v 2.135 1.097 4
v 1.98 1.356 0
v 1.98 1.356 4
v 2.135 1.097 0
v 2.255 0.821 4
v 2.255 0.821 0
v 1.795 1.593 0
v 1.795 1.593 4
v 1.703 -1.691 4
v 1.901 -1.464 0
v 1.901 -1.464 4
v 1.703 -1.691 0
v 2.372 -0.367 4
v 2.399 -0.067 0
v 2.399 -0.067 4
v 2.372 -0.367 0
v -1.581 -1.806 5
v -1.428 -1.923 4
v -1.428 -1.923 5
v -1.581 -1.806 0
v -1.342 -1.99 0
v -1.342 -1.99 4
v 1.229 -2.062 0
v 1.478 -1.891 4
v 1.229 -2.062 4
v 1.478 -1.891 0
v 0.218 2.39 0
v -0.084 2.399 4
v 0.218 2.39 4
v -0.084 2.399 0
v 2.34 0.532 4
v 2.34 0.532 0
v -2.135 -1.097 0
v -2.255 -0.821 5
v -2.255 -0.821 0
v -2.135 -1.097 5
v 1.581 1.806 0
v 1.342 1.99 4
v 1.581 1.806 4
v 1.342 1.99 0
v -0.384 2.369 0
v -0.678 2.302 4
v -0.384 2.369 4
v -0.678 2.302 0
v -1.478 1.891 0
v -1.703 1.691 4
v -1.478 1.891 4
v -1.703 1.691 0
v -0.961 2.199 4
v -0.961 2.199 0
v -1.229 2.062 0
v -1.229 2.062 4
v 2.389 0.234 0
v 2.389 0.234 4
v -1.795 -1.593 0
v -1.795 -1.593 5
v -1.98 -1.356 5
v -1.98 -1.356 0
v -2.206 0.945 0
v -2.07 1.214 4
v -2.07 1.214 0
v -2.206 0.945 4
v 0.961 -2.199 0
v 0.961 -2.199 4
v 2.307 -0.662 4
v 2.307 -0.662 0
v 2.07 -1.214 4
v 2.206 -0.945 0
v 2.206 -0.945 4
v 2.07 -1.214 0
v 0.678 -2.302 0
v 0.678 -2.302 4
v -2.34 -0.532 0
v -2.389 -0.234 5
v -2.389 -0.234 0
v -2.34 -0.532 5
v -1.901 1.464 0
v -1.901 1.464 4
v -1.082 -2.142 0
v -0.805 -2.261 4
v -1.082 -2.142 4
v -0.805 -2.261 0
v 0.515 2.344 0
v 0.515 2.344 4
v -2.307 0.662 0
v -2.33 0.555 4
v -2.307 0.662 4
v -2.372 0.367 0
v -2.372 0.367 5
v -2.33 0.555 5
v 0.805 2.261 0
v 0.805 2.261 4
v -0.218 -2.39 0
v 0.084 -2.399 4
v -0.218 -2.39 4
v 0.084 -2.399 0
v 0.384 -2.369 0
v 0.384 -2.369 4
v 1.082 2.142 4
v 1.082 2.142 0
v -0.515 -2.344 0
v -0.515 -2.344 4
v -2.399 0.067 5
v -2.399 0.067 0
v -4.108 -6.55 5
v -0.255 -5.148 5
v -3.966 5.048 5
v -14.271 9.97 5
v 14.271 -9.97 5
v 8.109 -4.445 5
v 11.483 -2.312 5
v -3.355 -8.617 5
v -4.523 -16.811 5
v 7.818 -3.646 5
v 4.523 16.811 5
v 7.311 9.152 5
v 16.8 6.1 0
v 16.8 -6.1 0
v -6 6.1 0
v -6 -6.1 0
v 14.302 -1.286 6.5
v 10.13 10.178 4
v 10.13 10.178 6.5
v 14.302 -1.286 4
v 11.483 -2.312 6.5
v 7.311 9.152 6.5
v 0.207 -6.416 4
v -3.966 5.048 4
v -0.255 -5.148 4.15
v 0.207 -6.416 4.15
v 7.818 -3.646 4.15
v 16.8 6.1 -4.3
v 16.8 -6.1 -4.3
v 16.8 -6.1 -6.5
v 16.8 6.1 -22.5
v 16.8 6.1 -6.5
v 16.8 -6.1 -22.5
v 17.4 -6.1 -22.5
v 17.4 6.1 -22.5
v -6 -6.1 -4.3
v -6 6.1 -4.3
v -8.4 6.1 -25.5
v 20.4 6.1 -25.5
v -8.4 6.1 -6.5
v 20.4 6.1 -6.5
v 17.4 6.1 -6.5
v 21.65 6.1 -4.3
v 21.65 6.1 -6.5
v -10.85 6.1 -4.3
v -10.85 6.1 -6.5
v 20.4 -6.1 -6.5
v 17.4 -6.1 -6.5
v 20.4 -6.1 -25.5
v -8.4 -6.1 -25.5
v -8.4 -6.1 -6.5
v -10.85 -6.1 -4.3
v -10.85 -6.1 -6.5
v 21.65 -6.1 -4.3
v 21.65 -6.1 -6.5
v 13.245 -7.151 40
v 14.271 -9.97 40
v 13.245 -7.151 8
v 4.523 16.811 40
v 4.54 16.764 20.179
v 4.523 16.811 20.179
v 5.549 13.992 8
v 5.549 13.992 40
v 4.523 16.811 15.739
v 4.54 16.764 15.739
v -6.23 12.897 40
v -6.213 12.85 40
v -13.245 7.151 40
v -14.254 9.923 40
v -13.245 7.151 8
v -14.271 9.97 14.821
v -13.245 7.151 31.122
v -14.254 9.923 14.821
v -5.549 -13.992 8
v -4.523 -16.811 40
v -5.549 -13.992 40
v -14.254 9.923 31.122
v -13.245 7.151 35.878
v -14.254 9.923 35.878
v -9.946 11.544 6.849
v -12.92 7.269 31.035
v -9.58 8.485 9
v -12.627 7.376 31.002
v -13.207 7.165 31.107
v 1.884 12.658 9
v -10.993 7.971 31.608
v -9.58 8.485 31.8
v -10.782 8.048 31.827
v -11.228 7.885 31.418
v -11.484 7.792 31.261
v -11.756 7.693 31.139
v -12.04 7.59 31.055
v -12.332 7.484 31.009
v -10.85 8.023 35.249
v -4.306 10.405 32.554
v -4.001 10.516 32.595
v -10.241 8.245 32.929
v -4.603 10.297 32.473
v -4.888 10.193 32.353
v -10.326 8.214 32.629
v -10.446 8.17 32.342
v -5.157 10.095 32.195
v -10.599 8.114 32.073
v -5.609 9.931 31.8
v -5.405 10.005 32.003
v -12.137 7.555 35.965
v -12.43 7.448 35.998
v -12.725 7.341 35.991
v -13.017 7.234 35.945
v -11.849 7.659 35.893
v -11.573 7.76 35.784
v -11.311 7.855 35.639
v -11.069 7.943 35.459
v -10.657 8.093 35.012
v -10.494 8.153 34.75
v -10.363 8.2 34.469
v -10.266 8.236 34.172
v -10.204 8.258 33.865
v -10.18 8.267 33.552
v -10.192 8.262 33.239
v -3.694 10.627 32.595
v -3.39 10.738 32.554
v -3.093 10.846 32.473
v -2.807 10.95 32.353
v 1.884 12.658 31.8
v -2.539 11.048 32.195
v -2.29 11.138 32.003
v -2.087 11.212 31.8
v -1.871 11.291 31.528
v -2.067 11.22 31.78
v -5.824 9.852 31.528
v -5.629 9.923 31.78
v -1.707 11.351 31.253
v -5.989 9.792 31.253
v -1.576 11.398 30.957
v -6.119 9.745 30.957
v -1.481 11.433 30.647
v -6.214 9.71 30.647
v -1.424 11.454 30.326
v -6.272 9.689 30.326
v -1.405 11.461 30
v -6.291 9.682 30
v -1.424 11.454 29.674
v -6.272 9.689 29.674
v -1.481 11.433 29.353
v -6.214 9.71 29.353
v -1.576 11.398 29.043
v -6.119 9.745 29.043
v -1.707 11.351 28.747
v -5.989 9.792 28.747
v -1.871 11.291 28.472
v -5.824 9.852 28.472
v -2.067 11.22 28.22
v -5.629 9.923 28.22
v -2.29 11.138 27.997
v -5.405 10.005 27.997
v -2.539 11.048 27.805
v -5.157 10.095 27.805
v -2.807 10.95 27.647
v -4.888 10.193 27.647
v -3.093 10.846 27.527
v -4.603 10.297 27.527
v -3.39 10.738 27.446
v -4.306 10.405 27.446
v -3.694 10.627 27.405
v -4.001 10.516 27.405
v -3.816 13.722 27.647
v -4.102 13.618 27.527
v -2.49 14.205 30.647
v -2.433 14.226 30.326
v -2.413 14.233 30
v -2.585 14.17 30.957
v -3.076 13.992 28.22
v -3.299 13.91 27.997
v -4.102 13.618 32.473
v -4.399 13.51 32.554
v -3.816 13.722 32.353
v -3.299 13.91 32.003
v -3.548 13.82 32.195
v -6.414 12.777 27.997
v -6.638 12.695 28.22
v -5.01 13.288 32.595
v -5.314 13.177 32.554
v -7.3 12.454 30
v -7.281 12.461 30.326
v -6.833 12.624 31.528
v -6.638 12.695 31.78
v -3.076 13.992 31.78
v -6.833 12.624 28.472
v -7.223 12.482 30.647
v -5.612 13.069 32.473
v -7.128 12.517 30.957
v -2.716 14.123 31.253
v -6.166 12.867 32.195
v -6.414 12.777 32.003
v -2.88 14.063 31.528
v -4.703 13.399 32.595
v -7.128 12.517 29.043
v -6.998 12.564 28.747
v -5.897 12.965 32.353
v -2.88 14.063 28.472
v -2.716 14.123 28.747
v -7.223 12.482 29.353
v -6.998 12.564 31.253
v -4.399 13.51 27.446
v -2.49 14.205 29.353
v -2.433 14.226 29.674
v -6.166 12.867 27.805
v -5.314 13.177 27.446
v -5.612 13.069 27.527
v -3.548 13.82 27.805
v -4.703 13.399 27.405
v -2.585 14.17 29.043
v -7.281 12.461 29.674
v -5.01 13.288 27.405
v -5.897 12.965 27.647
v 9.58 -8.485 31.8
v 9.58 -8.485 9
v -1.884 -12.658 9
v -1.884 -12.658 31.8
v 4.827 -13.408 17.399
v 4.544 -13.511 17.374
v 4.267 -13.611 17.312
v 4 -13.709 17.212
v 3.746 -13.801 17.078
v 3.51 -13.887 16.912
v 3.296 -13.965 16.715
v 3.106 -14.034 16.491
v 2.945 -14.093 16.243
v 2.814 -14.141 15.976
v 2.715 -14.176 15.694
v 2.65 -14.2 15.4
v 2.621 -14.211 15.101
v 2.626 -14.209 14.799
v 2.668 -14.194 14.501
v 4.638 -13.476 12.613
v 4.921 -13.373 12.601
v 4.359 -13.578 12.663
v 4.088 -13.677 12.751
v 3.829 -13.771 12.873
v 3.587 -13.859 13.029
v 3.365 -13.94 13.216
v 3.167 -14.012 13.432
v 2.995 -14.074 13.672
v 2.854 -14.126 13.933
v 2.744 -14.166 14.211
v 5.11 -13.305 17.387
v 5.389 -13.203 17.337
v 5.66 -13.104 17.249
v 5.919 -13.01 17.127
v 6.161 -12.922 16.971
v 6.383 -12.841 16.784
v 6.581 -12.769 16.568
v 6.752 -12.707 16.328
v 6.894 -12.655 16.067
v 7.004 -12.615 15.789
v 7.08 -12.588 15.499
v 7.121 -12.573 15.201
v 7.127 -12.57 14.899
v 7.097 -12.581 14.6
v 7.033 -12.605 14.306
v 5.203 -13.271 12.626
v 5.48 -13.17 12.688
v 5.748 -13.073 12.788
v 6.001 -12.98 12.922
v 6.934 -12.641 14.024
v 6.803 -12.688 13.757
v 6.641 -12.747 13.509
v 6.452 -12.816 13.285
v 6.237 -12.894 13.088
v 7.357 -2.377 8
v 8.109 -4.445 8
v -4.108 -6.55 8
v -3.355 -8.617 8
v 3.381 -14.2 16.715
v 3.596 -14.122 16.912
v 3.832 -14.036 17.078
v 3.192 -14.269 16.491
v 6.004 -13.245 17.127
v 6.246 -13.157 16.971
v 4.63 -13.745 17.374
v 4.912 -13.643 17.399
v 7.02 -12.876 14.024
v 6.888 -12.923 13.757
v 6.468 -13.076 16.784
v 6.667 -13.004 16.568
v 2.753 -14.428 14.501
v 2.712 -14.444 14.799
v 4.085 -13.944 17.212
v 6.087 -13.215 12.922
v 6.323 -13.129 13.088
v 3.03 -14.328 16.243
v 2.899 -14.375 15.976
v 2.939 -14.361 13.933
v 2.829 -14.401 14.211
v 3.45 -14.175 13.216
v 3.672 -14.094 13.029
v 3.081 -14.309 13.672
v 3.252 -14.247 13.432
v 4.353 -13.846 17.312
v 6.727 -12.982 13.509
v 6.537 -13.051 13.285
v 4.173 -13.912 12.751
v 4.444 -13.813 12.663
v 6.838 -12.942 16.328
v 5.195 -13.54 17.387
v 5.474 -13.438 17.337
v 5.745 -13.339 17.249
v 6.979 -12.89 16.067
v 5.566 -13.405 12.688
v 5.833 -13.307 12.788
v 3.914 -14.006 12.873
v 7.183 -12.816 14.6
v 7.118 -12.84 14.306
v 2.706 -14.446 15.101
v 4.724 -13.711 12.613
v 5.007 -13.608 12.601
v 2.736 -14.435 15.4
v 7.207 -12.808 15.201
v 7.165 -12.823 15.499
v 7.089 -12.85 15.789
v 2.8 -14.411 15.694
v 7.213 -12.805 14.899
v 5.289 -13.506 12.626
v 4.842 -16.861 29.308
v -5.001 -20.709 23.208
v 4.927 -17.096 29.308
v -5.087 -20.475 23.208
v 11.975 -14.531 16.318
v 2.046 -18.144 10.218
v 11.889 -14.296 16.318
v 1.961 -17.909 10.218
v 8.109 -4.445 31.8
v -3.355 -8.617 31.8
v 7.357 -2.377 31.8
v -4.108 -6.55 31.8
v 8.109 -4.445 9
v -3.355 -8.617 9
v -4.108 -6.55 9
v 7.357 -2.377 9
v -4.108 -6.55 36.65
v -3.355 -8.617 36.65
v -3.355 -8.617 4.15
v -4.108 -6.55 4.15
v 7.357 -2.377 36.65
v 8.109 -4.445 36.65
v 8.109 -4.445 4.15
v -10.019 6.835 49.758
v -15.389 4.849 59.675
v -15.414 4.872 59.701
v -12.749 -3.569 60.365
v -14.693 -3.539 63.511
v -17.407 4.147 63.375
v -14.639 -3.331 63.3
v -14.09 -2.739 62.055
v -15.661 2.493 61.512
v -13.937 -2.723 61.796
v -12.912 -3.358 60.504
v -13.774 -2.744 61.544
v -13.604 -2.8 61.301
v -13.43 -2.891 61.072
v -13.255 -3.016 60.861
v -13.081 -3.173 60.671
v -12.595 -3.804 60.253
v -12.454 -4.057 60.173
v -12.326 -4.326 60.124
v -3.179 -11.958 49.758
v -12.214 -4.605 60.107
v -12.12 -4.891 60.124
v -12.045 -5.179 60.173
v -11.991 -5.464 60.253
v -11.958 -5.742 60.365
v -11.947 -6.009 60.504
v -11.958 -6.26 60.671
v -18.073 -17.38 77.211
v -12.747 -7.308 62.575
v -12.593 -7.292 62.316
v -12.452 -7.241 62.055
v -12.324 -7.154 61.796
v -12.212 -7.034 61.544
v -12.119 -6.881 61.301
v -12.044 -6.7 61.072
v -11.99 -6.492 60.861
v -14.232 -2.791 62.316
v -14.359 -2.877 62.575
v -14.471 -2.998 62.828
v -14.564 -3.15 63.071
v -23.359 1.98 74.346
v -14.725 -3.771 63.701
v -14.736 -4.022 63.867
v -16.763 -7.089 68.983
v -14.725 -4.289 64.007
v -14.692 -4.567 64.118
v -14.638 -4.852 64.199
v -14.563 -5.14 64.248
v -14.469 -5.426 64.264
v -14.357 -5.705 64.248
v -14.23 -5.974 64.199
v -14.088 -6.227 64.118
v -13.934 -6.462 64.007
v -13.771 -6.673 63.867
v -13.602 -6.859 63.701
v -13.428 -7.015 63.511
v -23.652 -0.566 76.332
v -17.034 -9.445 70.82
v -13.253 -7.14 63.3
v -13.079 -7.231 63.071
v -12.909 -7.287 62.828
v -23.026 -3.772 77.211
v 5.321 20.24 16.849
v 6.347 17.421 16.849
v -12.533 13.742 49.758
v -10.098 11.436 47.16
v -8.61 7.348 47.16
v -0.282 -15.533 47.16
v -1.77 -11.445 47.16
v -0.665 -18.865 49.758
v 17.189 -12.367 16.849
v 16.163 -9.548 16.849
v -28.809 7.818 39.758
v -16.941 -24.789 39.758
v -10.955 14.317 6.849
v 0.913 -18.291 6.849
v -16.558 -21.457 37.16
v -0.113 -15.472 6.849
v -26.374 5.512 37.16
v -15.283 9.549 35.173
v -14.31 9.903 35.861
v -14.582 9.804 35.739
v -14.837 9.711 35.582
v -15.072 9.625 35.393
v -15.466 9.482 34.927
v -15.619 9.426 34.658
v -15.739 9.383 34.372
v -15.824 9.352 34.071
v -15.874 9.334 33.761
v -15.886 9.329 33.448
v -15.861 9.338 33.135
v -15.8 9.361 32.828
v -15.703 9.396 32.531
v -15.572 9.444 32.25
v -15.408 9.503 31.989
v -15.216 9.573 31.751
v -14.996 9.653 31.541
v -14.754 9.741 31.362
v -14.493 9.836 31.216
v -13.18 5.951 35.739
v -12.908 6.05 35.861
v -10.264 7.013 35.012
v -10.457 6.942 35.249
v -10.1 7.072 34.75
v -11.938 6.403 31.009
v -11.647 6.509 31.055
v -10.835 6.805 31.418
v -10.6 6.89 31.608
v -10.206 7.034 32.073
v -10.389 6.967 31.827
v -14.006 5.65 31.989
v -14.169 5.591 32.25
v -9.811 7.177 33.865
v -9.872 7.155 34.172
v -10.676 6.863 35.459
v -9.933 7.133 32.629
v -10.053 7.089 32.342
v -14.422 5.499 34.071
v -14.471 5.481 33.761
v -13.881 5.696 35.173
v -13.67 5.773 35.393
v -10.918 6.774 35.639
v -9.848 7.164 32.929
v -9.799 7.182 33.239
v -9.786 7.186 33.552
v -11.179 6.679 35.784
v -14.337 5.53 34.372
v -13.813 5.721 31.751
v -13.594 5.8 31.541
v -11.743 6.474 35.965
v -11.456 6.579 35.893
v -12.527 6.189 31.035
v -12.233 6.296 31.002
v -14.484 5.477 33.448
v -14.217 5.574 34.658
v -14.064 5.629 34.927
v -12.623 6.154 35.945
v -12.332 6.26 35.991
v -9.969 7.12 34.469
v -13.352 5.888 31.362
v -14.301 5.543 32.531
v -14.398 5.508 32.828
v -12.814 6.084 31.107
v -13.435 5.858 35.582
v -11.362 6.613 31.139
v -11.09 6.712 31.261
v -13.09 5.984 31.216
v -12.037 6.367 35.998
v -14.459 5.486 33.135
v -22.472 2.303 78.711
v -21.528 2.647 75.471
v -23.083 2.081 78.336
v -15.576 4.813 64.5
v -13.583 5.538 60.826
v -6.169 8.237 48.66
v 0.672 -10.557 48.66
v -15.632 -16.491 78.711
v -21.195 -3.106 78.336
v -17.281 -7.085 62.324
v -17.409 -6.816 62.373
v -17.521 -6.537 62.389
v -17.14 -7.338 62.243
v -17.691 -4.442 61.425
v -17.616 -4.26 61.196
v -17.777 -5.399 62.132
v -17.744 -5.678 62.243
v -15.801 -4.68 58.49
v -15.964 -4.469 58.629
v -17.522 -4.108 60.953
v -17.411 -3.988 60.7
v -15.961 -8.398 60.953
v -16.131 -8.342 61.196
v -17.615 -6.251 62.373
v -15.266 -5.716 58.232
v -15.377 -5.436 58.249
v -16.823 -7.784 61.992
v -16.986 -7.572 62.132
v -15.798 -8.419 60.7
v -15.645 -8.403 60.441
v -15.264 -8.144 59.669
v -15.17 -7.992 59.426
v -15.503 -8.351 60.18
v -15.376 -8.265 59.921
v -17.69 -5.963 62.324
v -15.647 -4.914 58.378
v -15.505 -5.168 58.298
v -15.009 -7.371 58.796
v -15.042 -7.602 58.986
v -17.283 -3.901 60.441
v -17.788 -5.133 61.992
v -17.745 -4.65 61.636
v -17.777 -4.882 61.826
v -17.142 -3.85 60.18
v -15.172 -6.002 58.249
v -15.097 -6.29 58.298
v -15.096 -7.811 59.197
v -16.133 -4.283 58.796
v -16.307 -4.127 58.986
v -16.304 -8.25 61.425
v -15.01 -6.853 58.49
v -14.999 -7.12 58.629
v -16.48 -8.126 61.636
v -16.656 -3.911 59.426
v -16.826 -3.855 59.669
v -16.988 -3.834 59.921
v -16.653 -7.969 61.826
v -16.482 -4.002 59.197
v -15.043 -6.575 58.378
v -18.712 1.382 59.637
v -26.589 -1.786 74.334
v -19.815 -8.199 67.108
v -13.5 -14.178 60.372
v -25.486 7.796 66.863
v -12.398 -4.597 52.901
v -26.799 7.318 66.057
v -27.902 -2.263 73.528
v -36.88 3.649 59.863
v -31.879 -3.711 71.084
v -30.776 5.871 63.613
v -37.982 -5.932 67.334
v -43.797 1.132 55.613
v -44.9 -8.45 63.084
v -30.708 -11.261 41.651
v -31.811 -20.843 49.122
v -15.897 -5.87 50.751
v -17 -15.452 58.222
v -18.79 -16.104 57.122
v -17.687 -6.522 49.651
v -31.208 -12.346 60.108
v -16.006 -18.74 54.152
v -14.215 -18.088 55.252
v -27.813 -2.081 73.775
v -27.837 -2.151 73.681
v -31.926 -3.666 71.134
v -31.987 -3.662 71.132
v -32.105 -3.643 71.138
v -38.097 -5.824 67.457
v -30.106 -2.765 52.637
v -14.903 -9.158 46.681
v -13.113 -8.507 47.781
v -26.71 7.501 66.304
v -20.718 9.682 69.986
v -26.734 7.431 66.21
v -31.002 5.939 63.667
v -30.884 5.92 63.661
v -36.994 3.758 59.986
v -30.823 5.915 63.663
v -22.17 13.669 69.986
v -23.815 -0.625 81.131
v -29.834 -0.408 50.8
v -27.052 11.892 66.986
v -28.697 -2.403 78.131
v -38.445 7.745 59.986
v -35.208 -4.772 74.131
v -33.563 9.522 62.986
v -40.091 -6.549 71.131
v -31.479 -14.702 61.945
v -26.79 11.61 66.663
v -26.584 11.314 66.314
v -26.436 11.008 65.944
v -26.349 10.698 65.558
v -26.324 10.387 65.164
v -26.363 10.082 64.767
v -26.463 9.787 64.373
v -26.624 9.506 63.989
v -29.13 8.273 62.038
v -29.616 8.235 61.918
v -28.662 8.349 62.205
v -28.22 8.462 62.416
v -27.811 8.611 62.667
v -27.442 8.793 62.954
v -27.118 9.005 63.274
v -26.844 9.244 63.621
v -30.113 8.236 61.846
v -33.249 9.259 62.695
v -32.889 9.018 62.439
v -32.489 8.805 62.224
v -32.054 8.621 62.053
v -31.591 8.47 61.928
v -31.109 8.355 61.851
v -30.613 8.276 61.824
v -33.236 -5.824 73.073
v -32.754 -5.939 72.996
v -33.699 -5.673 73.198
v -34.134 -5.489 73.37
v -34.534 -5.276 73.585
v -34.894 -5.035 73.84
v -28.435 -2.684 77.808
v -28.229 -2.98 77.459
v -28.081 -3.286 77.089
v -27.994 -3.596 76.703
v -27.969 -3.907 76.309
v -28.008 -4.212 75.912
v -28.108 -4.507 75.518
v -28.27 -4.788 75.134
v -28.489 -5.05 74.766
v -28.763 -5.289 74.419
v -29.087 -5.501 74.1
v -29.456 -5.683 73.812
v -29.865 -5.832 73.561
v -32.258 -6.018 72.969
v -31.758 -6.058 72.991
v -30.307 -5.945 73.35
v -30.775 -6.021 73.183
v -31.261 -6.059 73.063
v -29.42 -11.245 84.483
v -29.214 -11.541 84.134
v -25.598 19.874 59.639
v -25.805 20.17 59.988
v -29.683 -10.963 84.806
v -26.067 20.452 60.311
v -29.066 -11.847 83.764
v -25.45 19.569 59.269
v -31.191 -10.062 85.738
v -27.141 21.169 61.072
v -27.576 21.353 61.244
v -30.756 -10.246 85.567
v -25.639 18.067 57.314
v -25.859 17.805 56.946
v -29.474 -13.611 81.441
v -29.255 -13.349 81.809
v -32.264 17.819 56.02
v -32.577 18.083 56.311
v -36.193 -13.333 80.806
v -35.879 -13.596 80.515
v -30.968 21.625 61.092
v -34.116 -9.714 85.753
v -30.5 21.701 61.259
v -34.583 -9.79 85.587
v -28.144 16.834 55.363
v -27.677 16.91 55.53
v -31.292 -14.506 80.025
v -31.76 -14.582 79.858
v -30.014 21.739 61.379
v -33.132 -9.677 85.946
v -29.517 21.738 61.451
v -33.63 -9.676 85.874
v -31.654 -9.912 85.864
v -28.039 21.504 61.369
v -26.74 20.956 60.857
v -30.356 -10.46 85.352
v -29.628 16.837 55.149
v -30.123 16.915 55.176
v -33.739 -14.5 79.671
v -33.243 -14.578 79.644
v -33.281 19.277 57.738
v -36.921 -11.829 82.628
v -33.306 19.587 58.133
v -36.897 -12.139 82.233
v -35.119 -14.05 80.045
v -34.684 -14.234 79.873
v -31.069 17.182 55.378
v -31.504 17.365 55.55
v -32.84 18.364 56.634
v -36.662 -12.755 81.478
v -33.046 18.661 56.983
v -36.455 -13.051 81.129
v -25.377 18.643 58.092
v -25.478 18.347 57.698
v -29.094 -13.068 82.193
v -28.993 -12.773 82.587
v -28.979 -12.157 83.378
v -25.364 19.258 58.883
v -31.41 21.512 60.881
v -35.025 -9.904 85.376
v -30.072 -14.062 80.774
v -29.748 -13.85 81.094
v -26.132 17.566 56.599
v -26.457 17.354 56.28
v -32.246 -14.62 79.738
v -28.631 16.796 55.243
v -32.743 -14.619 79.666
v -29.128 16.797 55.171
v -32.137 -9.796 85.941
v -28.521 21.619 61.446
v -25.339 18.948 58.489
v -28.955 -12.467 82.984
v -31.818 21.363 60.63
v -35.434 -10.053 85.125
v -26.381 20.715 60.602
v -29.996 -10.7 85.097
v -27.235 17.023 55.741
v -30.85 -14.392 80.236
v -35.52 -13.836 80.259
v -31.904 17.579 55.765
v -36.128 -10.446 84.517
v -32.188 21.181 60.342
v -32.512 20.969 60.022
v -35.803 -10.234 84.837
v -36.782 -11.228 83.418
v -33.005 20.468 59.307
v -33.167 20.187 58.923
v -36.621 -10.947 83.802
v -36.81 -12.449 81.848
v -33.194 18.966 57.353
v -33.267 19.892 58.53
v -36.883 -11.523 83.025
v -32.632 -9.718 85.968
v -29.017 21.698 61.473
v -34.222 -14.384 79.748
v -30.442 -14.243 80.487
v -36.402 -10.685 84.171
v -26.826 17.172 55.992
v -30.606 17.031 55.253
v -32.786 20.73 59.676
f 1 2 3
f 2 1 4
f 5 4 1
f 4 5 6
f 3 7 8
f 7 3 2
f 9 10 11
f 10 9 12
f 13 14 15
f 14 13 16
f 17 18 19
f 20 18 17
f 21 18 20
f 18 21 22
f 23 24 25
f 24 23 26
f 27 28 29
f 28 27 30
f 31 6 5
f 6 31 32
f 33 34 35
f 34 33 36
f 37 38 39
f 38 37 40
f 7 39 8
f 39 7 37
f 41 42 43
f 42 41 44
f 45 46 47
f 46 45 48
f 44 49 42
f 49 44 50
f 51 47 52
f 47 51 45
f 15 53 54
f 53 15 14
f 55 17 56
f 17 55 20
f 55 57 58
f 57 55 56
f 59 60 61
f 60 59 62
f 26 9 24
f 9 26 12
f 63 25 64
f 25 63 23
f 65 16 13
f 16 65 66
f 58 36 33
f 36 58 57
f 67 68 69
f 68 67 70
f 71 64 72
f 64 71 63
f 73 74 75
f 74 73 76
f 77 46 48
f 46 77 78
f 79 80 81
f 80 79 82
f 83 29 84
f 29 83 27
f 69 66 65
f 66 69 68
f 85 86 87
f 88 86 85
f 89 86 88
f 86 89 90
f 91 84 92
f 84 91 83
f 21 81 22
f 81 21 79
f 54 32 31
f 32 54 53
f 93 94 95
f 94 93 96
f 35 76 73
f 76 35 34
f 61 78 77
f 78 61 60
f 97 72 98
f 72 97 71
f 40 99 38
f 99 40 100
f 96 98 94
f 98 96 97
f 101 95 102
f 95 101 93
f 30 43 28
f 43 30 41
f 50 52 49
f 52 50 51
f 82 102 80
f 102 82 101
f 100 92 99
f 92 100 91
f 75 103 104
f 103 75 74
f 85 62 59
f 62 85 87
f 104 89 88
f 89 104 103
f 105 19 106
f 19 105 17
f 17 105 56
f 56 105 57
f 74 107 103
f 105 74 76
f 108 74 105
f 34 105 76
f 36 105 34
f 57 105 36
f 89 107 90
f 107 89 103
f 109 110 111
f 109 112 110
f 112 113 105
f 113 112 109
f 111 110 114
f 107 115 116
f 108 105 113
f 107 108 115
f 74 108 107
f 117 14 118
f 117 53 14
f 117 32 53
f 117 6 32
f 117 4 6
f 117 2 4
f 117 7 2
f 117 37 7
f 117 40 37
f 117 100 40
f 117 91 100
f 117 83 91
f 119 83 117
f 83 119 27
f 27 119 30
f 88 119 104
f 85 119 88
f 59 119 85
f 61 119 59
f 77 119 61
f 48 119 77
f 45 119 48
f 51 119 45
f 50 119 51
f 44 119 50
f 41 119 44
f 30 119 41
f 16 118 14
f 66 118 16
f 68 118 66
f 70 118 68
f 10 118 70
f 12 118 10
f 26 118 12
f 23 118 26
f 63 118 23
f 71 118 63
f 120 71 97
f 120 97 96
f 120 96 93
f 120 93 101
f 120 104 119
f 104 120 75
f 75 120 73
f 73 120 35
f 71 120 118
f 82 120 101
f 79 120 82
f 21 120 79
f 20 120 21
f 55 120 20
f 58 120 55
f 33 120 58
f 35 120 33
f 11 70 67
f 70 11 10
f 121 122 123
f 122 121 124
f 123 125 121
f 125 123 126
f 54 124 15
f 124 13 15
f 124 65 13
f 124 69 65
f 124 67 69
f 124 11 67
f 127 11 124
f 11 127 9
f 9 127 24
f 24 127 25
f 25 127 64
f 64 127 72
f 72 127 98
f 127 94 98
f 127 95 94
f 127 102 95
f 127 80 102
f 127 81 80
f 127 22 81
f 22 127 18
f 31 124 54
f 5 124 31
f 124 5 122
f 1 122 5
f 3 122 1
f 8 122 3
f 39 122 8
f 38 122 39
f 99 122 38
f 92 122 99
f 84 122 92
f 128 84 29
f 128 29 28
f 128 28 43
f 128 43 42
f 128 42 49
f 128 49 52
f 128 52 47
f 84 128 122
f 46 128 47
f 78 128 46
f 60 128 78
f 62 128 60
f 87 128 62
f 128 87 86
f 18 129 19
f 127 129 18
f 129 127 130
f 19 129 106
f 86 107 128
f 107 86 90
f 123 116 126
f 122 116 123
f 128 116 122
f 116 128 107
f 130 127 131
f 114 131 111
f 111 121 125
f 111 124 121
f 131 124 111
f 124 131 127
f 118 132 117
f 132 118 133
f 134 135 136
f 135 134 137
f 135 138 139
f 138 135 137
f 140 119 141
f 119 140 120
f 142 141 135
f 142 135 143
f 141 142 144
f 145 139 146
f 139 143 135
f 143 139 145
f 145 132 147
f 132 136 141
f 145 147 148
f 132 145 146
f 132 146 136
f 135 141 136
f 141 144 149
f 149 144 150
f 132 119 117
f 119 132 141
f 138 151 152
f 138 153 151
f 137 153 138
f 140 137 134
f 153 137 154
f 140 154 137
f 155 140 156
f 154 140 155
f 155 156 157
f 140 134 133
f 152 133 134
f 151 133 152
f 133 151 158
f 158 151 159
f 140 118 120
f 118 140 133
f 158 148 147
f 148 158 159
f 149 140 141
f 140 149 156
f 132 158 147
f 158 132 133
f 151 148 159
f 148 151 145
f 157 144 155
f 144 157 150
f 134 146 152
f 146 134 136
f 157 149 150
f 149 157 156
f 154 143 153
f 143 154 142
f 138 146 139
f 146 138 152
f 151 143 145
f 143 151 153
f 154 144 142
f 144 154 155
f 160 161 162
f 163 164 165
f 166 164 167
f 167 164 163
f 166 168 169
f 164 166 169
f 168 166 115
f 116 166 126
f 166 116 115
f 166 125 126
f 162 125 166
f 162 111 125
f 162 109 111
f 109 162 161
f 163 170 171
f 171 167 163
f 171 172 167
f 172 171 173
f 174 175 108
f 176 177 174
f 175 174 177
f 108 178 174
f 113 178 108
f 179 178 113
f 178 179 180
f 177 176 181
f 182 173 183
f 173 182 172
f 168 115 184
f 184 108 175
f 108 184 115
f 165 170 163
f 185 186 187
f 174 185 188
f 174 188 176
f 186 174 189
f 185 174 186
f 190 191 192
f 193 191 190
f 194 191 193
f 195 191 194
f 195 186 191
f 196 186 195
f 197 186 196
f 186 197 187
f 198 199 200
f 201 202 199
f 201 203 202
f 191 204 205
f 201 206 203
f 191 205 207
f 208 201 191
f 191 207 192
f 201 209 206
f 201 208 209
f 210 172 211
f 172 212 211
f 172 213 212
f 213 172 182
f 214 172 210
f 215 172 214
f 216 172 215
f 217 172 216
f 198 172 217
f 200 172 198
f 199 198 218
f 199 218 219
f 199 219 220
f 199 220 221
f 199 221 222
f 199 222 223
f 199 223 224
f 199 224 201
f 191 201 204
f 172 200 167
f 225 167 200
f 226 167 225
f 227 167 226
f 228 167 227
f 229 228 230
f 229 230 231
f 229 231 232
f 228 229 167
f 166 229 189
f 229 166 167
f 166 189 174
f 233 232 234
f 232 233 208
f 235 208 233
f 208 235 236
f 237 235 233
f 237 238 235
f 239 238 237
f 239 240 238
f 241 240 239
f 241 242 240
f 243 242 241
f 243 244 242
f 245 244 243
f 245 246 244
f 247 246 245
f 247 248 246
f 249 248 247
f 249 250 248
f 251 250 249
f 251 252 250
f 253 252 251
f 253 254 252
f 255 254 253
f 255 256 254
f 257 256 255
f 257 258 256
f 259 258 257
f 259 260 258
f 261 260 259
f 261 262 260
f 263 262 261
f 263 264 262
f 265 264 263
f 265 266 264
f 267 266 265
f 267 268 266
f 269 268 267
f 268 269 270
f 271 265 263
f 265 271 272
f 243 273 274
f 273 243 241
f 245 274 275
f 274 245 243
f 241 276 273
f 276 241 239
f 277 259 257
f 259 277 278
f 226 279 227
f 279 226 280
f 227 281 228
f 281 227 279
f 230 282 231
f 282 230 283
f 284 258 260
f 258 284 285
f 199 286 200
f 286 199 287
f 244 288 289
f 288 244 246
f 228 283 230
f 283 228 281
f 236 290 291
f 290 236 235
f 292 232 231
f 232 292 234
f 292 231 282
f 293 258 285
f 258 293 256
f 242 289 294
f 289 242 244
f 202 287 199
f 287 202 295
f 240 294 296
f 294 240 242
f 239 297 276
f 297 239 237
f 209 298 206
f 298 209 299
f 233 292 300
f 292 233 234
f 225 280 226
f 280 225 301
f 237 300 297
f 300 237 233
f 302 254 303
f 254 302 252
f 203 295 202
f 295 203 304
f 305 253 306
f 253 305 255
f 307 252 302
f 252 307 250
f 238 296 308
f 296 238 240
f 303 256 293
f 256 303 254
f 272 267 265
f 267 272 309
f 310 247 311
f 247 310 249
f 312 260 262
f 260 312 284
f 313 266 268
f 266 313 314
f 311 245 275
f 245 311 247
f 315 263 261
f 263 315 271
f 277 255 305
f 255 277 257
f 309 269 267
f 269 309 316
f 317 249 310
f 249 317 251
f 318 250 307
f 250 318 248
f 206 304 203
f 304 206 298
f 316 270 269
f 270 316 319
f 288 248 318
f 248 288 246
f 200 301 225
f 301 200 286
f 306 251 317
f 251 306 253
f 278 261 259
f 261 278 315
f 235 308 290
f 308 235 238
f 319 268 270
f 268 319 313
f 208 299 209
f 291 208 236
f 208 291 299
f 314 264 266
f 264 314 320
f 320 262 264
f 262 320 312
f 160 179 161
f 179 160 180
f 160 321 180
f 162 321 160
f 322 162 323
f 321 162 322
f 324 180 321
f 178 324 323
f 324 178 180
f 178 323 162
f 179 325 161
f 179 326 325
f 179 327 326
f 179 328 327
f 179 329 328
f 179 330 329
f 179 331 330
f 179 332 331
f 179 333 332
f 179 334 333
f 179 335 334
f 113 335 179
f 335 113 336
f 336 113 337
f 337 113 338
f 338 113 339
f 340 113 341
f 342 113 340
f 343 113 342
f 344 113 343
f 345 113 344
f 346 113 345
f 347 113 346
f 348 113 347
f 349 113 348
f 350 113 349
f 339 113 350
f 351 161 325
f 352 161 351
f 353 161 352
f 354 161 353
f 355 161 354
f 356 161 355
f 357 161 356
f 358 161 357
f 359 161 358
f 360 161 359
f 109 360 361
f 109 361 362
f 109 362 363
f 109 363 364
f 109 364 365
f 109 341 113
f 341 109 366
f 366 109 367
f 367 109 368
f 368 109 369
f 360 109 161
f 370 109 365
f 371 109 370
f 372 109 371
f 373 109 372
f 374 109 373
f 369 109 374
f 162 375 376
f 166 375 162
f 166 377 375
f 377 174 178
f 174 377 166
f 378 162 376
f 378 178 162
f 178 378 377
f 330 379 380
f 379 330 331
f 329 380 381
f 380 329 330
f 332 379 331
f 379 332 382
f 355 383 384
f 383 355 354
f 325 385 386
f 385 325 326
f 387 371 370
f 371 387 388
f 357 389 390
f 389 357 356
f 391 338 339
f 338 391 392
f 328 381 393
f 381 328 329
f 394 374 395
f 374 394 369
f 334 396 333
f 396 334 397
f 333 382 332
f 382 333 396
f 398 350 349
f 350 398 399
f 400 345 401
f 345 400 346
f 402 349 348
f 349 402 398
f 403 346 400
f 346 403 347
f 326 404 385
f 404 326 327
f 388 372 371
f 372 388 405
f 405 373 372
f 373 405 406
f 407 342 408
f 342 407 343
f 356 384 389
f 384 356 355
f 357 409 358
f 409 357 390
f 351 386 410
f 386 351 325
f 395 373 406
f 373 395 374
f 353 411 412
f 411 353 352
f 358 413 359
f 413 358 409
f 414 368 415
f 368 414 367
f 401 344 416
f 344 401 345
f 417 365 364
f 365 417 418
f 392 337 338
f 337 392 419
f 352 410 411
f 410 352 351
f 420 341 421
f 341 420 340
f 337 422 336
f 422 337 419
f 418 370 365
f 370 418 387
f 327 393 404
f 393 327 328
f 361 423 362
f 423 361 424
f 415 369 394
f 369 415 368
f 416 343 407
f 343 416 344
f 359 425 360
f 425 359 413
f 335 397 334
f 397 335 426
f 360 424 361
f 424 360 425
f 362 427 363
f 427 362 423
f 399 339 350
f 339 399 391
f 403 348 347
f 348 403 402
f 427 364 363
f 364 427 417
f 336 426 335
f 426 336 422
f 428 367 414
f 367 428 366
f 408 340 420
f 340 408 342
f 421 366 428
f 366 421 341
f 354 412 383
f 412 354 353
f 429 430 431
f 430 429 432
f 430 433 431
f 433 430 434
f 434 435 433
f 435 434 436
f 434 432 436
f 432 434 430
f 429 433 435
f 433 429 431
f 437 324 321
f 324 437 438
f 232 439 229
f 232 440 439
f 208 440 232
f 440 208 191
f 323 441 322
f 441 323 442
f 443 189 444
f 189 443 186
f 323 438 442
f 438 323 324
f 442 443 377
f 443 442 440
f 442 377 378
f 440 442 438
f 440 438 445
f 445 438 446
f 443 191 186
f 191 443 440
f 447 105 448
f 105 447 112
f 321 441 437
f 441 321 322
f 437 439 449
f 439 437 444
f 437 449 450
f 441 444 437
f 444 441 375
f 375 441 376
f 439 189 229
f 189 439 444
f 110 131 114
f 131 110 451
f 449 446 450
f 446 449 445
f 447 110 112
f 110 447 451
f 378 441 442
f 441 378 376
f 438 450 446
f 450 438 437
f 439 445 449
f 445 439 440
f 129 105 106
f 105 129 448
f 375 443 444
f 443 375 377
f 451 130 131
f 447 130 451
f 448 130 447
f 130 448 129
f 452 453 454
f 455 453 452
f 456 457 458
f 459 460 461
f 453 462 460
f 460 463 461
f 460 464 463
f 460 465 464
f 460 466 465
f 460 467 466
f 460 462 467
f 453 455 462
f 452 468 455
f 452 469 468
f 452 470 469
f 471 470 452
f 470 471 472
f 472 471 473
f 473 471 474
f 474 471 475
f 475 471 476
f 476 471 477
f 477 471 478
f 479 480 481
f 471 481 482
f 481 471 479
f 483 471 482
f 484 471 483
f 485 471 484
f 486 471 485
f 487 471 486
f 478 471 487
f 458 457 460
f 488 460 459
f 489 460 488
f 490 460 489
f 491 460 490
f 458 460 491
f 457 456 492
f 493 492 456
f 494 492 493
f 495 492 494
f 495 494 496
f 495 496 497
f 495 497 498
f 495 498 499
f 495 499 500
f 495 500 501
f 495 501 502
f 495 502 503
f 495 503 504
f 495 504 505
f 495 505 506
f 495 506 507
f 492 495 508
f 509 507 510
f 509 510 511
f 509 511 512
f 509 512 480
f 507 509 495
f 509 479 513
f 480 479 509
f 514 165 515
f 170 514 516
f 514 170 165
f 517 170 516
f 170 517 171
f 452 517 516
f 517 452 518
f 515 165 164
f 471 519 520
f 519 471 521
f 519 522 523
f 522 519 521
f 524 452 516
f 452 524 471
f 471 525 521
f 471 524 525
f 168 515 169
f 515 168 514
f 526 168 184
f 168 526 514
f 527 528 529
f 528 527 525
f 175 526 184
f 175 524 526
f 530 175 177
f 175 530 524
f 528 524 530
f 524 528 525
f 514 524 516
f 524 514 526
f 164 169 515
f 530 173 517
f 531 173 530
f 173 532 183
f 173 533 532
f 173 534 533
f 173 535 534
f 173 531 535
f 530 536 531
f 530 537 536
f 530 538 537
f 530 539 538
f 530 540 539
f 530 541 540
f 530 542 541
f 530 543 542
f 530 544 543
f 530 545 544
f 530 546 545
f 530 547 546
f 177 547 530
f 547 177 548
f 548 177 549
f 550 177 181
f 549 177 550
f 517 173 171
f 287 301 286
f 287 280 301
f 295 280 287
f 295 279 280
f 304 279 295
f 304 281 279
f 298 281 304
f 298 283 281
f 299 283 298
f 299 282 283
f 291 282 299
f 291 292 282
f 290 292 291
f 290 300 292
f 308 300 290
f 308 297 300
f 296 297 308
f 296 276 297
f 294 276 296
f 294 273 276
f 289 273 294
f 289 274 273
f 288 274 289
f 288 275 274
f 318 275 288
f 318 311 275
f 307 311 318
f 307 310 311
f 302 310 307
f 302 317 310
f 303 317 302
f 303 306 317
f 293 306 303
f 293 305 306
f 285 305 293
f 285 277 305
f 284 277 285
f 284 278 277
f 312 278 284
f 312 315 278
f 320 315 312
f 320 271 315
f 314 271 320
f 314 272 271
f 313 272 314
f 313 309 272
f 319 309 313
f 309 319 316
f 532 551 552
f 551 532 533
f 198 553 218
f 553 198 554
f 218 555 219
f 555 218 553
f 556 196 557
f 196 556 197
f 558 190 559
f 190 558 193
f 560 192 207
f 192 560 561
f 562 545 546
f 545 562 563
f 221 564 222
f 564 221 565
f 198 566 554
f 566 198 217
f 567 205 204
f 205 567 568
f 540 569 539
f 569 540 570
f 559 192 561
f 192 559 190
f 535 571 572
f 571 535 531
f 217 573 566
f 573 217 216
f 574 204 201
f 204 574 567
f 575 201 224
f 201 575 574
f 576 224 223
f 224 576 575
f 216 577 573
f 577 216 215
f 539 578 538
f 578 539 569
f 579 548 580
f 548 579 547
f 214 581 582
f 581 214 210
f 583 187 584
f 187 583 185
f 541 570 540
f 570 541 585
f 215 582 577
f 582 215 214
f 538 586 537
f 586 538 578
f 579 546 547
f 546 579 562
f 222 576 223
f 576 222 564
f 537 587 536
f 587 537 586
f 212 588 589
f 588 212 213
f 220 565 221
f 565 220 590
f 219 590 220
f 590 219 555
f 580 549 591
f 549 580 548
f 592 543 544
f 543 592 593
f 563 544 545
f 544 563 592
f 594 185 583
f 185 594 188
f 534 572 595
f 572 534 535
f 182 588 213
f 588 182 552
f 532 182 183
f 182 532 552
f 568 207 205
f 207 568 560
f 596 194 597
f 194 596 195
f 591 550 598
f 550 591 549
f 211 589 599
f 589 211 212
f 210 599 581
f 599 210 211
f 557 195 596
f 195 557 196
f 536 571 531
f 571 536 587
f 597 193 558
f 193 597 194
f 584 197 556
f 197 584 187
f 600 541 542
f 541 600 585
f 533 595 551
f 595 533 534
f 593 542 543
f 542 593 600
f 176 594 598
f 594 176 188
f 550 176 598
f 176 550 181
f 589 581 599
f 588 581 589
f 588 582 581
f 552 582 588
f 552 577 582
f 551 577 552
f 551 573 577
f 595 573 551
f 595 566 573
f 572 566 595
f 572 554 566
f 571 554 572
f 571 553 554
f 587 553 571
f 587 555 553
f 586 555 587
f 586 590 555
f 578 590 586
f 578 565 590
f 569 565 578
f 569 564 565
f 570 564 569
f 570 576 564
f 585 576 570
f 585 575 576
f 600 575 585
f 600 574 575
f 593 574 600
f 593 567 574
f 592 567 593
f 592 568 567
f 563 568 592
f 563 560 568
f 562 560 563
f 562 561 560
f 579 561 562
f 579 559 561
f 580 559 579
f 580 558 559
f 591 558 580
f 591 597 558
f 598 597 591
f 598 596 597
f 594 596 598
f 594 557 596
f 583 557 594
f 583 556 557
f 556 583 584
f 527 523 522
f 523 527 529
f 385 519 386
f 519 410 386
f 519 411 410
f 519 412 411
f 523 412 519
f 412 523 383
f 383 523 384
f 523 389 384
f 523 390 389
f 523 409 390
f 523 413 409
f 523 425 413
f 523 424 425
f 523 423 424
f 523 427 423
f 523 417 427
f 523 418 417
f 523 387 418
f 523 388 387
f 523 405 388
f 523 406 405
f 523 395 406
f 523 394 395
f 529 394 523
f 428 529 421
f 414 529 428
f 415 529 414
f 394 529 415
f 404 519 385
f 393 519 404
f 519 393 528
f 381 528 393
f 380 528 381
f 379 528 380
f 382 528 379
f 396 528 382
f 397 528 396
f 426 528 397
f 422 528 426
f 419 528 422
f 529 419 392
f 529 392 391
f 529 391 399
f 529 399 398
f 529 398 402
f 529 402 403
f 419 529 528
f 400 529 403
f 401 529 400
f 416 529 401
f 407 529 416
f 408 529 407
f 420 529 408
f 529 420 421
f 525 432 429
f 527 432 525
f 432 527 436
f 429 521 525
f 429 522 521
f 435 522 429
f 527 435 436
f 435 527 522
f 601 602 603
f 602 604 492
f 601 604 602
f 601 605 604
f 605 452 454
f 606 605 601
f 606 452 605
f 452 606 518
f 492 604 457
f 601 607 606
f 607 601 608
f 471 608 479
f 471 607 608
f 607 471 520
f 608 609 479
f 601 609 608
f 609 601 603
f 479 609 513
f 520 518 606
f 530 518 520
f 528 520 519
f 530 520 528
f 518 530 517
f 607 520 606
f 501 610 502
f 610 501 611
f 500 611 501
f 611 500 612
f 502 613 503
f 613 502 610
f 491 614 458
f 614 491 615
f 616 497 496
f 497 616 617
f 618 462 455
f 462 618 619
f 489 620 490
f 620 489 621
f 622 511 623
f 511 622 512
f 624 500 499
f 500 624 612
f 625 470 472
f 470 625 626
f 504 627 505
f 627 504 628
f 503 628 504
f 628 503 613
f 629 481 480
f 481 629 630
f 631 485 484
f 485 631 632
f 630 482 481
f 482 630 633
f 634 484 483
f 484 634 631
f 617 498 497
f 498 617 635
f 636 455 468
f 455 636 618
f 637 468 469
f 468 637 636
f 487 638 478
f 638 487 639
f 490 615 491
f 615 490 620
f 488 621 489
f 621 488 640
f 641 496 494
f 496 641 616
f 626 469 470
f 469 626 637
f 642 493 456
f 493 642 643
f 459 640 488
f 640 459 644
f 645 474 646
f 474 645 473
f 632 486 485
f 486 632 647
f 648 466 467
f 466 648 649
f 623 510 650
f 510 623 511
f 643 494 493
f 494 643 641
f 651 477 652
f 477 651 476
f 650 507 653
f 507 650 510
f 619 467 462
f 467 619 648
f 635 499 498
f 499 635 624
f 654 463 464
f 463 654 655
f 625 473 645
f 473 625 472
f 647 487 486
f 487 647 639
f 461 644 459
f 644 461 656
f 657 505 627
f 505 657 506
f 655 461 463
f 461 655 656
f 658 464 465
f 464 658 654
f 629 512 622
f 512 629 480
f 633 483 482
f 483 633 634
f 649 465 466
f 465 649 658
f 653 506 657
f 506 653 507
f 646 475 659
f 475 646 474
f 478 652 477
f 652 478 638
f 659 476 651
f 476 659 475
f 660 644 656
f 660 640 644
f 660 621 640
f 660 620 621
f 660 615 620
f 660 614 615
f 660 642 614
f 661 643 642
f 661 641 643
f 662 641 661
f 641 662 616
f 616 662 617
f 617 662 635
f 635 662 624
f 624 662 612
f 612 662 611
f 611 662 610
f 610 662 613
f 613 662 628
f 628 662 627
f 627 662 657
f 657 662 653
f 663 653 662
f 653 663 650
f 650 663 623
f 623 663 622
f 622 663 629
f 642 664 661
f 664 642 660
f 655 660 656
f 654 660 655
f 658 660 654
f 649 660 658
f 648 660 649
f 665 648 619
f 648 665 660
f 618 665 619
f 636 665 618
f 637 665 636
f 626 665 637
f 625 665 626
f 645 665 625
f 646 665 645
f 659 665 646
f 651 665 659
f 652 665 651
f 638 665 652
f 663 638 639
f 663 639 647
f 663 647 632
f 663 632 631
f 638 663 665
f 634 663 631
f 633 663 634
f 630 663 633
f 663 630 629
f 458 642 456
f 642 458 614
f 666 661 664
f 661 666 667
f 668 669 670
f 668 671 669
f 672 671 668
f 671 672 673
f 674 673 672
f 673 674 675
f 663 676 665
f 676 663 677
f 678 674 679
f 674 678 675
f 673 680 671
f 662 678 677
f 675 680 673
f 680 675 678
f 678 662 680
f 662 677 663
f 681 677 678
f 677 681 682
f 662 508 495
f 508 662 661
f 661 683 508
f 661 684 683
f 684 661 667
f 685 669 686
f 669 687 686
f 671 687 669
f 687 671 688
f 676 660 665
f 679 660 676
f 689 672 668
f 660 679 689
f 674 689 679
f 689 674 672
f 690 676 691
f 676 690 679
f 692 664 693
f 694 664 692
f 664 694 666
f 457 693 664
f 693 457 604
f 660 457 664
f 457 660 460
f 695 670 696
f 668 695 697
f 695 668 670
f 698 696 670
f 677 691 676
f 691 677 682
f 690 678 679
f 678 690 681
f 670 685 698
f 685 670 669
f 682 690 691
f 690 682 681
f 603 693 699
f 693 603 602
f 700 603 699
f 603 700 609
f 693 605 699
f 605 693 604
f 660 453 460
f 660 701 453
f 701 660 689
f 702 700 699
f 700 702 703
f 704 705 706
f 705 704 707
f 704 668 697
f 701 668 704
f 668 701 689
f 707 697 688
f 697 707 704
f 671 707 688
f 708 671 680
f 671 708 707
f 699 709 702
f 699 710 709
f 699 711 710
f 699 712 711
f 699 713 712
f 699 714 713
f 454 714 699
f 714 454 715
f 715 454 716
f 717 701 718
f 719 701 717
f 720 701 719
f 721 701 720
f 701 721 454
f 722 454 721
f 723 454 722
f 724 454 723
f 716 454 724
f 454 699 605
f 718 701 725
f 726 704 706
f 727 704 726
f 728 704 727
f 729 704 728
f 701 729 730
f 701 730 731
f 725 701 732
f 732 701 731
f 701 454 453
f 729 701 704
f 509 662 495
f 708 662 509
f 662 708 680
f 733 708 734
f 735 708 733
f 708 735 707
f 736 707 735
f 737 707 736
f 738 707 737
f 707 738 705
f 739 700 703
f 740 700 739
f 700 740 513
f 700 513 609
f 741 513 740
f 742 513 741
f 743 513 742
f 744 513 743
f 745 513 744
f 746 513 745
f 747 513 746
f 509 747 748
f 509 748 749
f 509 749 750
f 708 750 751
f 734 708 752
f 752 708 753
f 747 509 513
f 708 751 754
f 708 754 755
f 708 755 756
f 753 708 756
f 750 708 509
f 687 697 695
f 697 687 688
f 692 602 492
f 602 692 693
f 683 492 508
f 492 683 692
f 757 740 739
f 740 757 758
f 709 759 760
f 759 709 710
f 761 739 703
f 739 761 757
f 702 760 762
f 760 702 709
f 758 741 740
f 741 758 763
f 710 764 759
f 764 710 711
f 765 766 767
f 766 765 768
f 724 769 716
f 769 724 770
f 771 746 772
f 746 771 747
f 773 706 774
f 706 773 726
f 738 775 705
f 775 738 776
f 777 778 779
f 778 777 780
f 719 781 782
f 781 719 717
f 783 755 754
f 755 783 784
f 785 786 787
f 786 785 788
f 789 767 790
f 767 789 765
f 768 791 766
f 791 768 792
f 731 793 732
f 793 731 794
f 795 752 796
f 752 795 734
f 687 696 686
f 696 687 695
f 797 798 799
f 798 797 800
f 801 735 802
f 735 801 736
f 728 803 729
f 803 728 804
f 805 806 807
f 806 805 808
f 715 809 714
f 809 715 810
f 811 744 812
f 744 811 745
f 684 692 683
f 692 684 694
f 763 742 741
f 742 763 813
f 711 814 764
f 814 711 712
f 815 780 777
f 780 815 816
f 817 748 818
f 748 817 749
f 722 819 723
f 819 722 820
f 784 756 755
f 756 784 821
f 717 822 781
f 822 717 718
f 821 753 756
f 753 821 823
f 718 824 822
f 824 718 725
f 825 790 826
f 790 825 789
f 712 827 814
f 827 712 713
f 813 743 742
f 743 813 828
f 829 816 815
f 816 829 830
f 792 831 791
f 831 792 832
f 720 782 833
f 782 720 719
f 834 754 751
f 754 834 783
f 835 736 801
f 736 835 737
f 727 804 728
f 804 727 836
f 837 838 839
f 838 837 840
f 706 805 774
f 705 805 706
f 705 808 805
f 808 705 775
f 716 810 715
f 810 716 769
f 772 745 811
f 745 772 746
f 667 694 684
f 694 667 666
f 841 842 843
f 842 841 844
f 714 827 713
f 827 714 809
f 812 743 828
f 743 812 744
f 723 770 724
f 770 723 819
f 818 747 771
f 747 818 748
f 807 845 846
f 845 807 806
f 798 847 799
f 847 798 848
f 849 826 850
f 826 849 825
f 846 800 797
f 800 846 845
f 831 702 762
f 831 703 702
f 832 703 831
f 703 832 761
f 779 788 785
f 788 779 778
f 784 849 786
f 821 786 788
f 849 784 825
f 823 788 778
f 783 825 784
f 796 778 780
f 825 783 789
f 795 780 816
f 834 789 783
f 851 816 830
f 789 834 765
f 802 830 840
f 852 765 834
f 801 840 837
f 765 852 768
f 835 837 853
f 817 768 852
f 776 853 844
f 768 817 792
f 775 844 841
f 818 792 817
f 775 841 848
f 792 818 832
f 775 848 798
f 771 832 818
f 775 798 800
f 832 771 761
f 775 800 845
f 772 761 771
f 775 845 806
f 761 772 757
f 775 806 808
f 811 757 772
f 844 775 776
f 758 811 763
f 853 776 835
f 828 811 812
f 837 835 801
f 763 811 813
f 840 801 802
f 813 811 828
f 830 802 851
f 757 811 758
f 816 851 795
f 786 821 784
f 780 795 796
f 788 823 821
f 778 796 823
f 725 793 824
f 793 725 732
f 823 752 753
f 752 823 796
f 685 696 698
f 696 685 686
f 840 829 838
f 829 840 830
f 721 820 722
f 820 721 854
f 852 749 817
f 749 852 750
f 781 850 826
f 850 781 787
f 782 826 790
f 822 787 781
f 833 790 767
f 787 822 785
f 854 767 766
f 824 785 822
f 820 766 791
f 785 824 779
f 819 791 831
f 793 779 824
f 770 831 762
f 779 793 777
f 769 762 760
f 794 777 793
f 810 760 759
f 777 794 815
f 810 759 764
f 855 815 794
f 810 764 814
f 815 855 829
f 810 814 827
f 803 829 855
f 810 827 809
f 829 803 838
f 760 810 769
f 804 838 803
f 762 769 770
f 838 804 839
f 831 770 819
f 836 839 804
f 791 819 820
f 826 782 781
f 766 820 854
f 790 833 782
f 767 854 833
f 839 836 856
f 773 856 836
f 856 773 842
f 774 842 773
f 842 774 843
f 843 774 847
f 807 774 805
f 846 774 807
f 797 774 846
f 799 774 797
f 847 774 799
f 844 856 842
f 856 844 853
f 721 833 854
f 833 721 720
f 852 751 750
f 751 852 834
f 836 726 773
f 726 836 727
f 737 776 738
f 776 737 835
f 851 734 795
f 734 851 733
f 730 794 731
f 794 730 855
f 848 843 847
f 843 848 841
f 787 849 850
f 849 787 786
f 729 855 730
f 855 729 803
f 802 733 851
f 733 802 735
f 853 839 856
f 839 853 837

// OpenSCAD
// MG90S 3-Axis Joint - Zero Hardcoded Values
// Designed for a 3-segment line with Yaw, Pitch, and Roll capability

/* [Joint Controls] */
Yaw_Angle     = 20; 
Pitch_Angle   = 30; 
Roll_Angle    = 45;

/* [Servo Constants (MG90S Spec)] */
S_Width       = 12.2; // Width of the servo body
S_Length      = 22.8; // Length of the main rectangular body block
S_Body_H      = 22.5; // Total height of the main plastic housing
S_Shaft_Off   = 6.0;  // Offset from front edge to gear center (critical for alignment)
S_Flange_L    = 32.5; // Total length including mounting "ears"
S_Flange_H    = 2.2;  // Thickness of the mounting flanges
S_Flange_Z    = 16.0; // Distance from bottom of body to bottom of flange
S_Shaft_D     = 4.8;  // Diameter of the output gear/shaft
S_Shaft_H     = 5.0;  // Height of the shaft above the body
S_Horn_L      = 15.0; // Length of the plastic horn/arm
S_Horn_T      = 2.5;  // Thickness of the servo horn

/* [Bracket Constants] */
thick         = 3.0;   // Structural wall thickness
clearance     = 0.1;   // Precision tolerance
pivot_z       = 25.0;  // Center of rotation for Pitch axis
base_gap      = 5.0;   // Vertical space above Yaw horn
yoke_arm_w    = 20.0;  // Width of the bracket arms
pin_d         = 5.0;   // Passive pivot pin diameter

// Calculated widths to ensure perfect nesting
inner_w       = S_Body_H; 
outer_w       = inner_w + (thick * 2) + (clearance * 2) + (thick * 2);

$fn = 50;

module mg90s_core(rotation=0) {
    // 1. Static Body
    color("DimGray") {
        translate([-S_Shaft_Off, -S_Width/2, -S_Body_H])
            cube([S_Length, S_Width, S_Body_H]);
    }
    color("Gray") {
        translate([-(S_Flange_L-S_Length)/2 - S_Shaft_Off, -S_Width/2, -S_Body_H + S_Flange_Z])
            cube([S_Flange_L, S_Width, S_Flange_H]);
    }
    // 2. Rotating Output
    rotate([0, 0, rotation]) {
        color("Gold") cylinder(d=S_Shaft_D, h=S_Shaft_H);
        color("White") translate([-2, -S_Width/2, S_Shaft_H - 1]) 
            cube([S_Horn_L, S_Width, S_Horn_T]);
    }
}

module inner_yoke_blue(w, h, t) {
    color("RoyalBlue", 0.6) {
        translate([-yoke_arm_w/2, -w/2 - t, 0]) cube([yoke_arm_w, w + (t * 2), t]);
        for(side = [-1, 1]) {
            translate([-yoke_arm_w/2, (w/2 + t) * side - (side==1 ? t : 0), 0])
                difference() {
                    cube([yoke_arm_w, t, h]);
                    if(side == 1) // Passive Hole
                        translate([yoke_arm_w/2, t/2, h - 10]) 
                            rotate([90, 0, 0]) cylinder(d=pin_d + 0.2, h=t+2, center=true);
                }
        }
    }
}

module head(w, h, d, t) {
    color("Red", 0.6) {
        translate([-d/2, -w/2 - t, 0]) cube([d, w + (t * 2), t]);
        rotate([90, 0, 0]) cylinder(d=8, h=40, center=true);
        for(side = [-1, 1]) {
            translate([-d/2, (w/2 + t) * side - (side==1 ? t : 0), 0])
                 cube([d, t, h]);
        }
    }
}

module feet(w, h, d, t) {
    color("Green", 0.6) {
        rotate([0,0,90]) {
            translate([-d/2, -w/2 - t, 0]) cube([d, w + (t * 2), t]);
            for(side = [-1, 1]) {
                translate([-d/2, (w/2 + t) * side - (side==1 ? t : 0), 0])
                        cube([d, t, h]);
            }
        }
    }
}

module outer_yoke_purple(w, h, t) {
    color("Purple", 0.7) {

        translate([yoke_arm_w/2, -yoke_arm_w/2, h]) rotate([90, 0, 90]) cube([yoke_arm_w, w, t]);
        
        translate([-yoke_arm_w/2, -w/2, h]) cube([yoke_arm_w, w, t]);

        for(side = [-1, 1]) {
            translate([-yoke_arm_w/2, (w/2) * side - (side==1 ? t : 0), 0]) {
                cube([yoke_arm_w, t, h + t]);
                if(side == 1) // Passive Pin
                    translate([yoke_arm_w/2, 0, h - 10]) 
                        rotate([90, 0, 0]) cylinder(d=pin_d, h=t + clearance + 1);
            }
        }
    }
}

module joint_assembly() {
    // 1. YAW (Servo 1)
    mg90s_core(Yaw_Angle);
    translate([S_Shaft_Off , 0,-(S_Body_H+thick)]) feet(S_Length,20,S_Width,thick);

    rotate([0, 0, Yaw_Angle]) 
    translate([0, 0, S_Shaft_H ]) {
        
        inner_yoke_blue(inner_w, pivot_z + 10, thick);
        
        // 2. PITCH (Servo 2)
        translate([0, 0, pivot_z])
        rotate([90, 0, 0]) rotate([0, 0, 90]) {
            
            translate([-S_Horn_L, 0, inner_w/2])
                mg90s_core(Pitch_Angle);
            
            // 3. ROLL (Servo 3 & Outer Yoke)
            rotate([0, 0, Pitch_Angle])
            translate([0, 0, inner_w/2 + (thick * 3) - clearance]) {
                
                // Align purple yoke to wrap over blue
                rotate([-90, 0, -90])
                translate([-pivot_z/4, 20, -outer_w/2])
                    outer_yoke_purple(outer_w, pivot_z + 10, thick);
                
                // 4. THE ROLL SERVO
                // Mounted to the top of the Purple Yoke
                translate([35, 0, -20])
                rotate([90, Roll_Angle, 0]) {
                    mg90s_core(Roll_Angle);
                    
                    rotate([0, -90, 0]) translate([-(thick + 2/2) , 0, -20]) head(S_Width, 15, 20, thick)
                    // Final End Effector
                    rotate([0, 0, Roll_Angle])
                    color("Red") translate([0, 0, S_Shaft_H + 5]) 
                        cylinder(d1=2, d2=0, h=25);
                }
            }
        }
    }
}

joint_assembly();
%translate([0,0,-30]) cylinder(d=0.5, h=160);
